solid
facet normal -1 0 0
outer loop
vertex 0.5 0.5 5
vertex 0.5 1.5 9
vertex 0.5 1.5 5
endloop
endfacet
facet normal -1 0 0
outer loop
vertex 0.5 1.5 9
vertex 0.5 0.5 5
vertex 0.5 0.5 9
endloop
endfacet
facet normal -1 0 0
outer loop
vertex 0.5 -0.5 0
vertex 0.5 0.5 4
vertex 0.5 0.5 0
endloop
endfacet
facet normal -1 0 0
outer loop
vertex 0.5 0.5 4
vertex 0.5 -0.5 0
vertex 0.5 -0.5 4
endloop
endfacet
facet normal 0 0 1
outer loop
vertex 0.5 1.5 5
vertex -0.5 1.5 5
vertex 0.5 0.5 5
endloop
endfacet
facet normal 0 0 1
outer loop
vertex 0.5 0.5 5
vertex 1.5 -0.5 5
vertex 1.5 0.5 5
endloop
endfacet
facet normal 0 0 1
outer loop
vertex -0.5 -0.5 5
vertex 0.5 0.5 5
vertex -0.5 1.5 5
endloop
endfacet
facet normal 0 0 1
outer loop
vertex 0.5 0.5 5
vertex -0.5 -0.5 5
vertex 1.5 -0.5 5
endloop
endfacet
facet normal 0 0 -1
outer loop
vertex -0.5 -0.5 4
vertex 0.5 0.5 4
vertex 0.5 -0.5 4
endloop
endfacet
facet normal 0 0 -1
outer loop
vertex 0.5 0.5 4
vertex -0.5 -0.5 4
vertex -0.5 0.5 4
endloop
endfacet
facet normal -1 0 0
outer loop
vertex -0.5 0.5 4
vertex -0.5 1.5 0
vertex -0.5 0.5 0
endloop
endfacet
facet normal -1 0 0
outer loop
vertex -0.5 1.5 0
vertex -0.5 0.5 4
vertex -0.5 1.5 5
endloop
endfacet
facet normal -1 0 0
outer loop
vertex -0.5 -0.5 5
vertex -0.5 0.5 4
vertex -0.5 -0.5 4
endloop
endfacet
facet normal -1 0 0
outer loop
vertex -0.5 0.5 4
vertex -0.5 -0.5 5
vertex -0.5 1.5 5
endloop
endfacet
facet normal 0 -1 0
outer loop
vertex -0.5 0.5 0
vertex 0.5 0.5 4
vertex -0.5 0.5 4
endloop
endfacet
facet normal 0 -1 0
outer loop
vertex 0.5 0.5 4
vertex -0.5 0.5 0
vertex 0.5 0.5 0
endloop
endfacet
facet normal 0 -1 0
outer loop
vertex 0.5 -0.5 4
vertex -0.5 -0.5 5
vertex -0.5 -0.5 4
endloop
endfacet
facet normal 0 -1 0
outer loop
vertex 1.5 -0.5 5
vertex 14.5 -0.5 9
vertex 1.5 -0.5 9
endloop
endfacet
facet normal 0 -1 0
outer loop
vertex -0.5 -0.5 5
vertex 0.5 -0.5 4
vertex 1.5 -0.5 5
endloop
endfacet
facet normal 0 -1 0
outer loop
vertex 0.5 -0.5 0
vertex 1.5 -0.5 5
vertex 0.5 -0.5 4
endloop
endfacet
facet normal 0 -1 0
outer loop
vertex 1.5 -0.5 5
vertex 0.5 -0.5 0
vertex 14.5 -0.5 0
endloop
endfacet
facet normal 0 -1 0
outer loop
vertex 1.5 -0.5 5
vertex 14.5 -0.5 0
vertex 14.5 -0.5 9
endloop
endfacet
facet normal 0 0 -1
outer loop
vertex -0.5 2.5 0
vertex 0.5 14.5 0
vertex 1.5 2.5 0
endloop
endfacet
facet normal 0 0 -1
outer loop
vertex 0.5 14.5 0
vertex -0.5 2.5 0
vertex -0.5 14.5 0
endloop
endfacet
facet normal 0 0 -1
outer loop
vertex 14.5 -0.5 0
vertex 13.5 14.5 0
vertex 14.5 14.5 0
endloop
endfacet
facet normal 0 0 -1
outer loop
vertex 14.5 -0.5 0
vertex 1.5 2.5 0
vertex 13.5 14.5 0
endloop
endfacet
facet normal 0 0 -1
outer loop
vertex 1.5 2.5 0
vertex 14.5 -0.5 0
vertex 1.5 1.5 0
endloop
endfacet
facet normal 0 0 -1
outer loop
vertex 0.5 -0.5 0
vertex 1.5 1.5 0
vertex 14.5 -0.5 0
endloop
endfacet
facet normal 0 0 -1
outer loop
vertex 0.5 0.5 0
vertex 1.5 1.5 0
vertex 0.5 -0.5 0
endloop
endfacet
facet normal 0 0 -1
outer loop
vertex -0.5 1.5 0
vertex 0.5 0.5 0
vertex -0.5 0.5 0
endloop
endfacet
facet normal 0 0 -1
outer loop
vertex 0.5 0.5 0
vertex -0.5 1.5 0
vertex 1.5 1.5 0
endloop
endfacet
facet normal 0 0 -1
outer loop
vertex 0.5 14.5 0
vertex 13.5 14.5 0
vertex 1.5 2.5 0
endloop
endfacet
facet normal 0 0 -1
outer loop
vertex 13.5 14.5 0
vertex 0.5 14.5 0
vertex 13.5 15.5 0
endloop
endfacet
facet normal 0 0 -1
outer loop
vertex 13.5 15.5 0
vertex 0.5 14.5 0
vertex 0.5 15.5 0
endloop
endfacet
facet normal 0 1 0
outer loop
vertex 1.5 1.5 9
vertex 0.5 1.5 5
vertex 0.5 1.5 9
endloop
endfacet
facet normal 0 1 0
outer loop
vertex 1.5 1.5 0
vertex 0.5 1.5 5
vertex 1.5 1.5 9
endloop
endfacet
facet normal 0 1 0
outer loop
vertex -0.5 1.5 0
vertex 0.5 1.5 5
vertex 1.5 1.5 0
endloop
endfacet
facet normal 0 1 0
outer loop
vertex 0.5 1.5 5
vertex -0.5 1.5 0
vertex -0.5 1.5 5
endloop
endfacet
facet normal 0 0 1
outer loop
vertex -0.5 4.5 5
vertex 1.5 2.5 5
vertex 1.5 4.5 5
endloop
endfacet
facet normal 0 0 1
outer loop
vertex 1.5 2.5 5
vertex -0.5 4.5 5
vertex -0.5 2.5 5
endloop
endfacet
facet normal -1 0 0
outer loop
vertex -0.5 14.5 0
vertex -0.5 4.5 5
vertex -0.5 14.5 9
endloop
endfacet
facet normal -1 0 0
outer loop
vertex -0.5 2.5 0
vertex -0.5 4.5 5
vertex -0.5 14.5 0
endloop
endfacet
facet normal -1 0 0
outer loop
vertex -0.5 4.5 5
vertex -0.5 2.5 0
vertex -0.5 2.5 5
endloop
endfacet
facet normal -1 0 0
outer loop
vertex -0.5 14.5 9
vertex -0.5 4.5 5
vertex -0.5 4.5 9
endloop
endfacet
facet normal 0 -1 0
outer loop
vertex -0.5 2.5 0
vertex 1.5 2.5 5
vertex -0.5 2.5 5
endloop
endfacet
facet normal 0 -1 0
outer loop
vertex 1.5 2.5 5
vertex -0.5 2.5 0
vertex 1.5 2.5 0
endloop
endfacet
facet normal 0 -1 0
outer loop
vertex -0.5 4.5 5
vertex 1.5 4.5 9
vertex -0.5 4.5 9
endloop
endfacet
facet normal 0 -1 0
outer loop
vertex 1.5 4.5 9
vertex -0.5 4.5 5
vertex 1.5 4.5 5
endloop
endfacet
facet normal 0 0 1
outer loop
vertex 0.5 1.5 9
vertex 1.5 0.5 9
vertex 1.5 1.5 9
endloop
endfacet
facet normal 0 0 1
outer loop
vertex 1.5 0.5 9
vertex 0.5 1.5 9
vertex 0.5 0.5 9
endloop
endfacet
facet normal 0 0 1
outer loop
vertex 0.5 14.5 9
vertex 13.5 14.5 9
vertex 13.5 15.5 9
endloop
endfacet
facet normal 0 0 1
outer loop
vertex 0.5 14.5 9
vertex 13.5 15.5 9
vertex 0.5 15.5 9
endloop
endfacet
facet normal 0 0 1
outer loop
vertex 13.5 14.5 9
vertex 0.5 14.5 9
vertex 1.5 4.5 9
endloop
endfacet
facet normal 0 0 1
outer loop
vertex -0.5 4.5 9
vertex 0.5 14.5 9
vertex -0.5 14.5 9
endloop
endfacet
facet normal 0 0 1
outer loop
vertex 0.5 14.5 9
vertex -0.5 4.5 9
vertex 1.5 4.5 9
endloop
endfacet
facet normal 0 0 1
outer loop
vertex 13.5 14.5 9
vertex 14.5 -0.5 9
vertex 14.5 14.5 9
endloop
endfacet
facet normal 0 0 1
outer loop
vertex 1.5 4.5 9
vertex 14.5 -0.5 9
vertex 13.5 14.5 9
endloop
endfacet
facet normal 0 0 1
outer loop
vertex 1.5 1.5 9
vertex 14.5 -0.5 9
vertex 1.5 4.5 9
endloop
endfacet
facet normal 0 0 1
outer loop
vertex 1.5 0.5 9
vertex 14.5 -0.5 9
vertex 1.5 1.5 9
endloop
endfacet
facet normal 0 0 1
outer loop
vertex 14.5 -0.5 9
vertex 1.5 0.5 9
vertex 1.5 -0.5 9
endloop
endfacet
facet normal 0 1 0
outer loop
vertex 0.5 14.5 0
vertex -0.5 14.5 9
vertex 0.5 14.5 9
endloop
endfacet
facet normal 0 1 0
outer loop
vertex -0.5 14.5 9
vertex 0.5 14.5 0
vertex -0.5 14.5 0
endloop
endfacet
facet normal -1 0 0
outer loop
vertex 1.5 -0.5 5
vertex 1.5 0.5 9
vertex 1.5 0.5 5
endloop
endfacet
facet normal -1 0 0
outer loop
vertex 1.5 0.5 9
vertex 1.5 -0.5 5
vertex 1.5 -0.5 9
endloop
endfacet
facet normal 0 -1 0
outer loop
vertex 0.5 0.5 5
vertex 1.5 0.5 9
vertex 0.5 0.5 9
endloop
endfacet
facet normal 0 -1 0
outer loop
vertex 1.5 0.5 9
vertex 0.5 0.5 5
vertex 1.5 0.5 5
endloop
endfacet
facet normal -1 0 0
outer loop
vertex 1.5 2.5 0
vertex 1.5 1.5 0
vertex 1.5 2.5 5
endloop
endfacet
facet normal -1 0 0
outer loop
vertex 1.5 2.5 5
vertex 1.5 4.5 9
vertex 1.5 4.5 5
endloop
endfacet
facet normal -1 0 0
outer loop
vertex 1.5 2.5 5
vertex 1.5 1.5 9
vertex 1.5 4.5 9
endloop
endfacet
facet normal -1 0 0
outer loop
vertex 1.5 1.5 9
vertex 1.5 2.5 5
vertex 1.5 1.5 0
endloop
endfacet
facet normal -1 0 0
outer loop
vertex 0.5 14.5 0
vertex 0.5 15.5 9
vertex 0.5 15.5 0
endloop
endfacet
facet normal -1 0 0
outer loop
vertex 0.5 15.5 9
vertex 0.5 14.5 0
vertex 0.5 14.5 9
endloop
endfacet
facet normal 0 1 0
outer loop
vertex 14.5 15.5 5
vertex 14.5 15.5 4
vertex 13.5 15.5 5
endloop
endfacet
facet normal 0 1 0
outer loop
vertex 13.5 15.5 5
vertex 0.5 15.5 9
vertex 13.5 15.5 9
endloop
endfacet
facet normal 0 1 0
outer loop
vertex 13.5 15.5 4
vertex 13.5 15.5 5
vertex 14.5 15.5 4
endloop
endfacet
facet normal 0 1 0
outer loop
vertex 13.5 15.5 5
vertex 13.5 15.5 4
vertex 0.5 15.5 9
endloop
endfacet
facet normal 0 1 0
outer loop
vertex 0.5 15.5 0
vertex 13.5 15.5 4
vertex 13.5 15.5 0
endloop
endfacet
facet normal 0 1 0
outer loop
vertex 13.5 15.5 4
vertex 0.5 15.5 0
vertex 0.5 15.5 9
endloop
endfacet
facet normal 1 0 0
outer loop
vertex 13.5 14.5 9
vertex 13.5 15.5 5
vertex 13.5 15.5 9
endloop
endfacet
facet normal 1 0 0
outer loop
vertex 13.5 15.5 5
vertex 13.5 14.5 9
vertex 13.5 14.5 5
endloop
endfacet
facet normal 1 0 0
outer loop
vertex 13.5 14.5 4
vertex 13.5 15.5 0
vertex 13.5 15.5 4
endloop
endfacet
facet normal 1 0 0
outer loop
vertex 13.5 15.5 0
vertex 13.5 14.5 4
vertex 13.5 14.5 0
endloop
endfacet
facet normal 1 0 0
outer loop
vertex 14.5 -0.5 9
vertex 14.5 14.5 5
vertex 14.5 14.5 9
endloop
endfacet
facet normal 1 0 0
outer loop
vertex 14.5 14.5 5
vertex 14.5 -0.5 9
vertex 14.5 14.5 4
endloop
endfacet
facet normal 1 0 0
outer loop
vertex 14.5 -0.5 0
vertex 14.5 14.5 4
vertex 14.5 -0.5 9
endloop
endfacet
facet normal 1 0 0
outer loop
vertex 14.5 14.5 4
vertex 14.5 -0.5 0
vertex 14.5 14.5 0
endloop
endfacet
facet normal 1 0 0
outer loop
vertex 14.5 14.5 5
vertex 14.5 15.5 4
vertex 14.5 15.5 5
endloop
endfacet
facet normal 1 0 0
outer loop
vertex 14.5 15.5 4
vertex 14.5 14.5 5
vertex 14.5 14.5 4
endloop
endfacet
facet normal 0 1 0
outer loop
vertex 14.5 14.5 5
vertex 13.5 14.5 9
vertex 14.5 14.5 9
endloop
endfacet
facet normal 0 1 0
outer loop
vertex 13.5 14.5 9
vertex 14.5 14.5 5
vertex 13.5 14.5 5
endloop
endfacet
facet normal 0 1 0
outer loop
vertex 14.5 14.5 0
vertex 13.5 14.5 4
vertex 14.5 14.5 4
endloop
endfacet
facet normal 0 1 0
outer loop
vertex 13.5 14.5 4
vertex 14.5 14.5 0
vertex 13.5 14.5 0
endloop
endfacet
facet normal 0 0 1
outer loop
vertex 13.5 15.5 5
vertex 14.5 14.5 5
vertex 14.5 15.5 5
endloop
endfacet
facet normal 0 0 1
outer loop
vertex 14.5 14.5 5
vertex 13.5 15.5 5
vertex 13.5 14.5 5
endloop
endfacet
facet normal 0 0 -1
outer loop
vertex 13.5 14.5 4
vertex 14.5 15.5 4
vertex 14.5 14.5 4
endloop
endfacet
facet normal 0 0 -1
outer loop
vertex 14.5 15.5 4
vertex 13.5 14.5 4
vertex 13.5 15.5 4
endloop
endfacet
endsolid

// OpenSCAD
union() {
    translate([0, 0, 4.5]) color([1, 0, 0]) cube([1, 1, 1], center=true);
    translate([0, 1, 2.5]) cube([1, 1, 5], center=true);
    translate([0, 3, 2.5]) cube([1, 1, 5], center=true);
    translate([0, 4, 2.5]) cube([1, 1, 5], center=true);
    translate([0, 5, 4.5]) cube([1, 1, 9], center=true);
    translate([0, 6, 4.5]) cube([1, 1, 9], center=true);
    translate([0, 7, 4.5]) cube([1, 1, 9], center=true);
    translate([0, 8, 4.5]) cube([1, 1, 9], center=true);
    translate([0, 9, 4.5]) cube([1, 1, 9], center=true);
    translate([0, 10, 4.5]) cube([1, 1, 9], center=true);
    translate([0, 11, 4.5]) cube([1, 1, 9], center=true);
    translate([0, 12, 4.5]) cube([1, 1, 9], center=true);
    translate([0, 13, 4.5]) cube([1, 1, 9], center=true);
    translate([0, 14, 4.5]) cube([1, 1, 9], center=true);
    translate([1, 0, 2.5]) cube([1, 1, 5], center=true);
    translate([1, 1, 4.5]) cube([1, 1, 9], center=true);
    translate([1, 3, 2.5]) cube([1, 1, 5], center=true);
    translate([1, 4, 2.5]) cube([1, 1, 5], center=true);
    translate([1, 5, 4.5]) cube([1, 1, 9], center=true);
    translate([1, 6, 4.5]) cube([1, 1, 9], center=true);
    translate([1, 7, 4.5]) cube([1, 1, 9], center=true);
    translate([1, 8, 4.5]) cube([1, 1, 9], center=true);
    translate([1, 9, 4.5]) cube([1, 1, 9], center=true);
    translate([1, 10, 4.5]) cube([1, 1, 9], center=true);
    translate([1, 11, 4.5]) cube([1, 1, 9], center=true);
    translate([1, 12, 4.5]) cube([1, 1, 9], center=true);
    translate([1, 13, 4.5]) cube([1, 1, 9], center=true);
    translate([1, 14, 4.5]) cube([1, 1, 9], center=true);
    translate([1, 15, 4.5]) cube([1, 1, 9], center=true);
    translate([2, 0, 4.5]) cube([1, 1, 9], center=true);
    translate([2, 1, 4.5]) cube([1, 1, 9], center=true);
    translate([2, 2, 4.5]) cube([1, 1, 9], center=true);
    translate([2, 3, 4.5]) cube([1, 1, 9], center=true);
    translate([2, 4, 4.5]) cube([1, 1, 9], center=true);
    translate([2, 5, 4.5]) cube([1, 1, 9], center=true);
    translate([2, 6, 4.5]) cube([1, 1, 9], center=true);
    translate([2, 7, 4.5]) cube([1, 1, 9], center=true);
    translate([2, 8, 4.5]) cube([1, 1, 9], center=true);
    translate([2, 9, 4.5]) cube([1, 1, 9], center=true);
    translate([2, 10, 4.5]) cube([1, 1, 9], center=true);
    translate([2, 11, 4.5]) cube([1, 1, 9], center=true);
    translate([2, 12, 4.5]) cube([1, 1, 9], center=true);
    translate([2, 13, 4.5]) cube([1, 1, 9], center=true);
    translate([2, 14, 4.5]) cube([1, 1, 9], center=true);
    translate([2, 15, 4.5]) cube([1, 1, 9], center=true);
    translate([3, 0, 4.5]) cube([1, 1, 9], center=true);
    translate([3, 1, 4.5]) cube([1, 1, 9], center=true);
    translate([3, 2, 4.5]) cube([1, 1, 9], center=true);
    translate([3, 3, 4.5]) cube([1, 1, 9], center=true);
    translate([3, 4, 4.5]) cube([1, 1, 9], center=true);
    translate([3, 5, 4.5]) cube([1, 1, 9], center=true);
    translate([3, 6, 4.5]) cube([1, 1, 9], center=true);
    translate([3, 7, 4.5]) cube([1, 1, 9], center=true);
    translate([3, 8, 4.5]) cube([1, 1, 9], center=true);
    translate([3, 9, 4.5]) cube([1, 1, 9], center=true);
    translate([3, 10, 4.5]) cube([1, 1, 9], center=true);
    translate([3, 11, 4.5]) cube([1, 1, 9], center=true);
    translate([3, 12, 4.5]) cube([1, 1, 9], center=true);
    translate([3, 13, 4.5]) cube([1, 1, 9], center=true);
    translate([3, 14, 4.5]) cube([1, 1, 9], center=true);
    translate([3, 15, 4.5]) cube([1, 1, 9], center=true);
    translate([4, 0, 4.5]) cube([1, 1, 9], center=true);
    translate([4, 1, 4.5]) cube([1, 1, 9], center=true);
    translate([4, 2, 4.5]) cube([1, 1, 9], center=true);
    translate([4, 3, 4.5]) cube([1, 1, 9], center=true);
    translate([4, 4, 4.5]) cube([1, 1, 9], center=true);
    translate([4, 5, 4.5]) cube([1, 1, 9], center=true);
    translate([4, 6, 4.5]) cube([1, 1, 9], center=true);
    translate([4, 7, 4.5]) cube([1, 1, 9], center=true);
    translate([4, 8, 4.5]) cube([1, 1, 9], center=true);
    translate([4, 9, 4.5]) cube([1, 1, 9], center=true);
    translate([4, 10, 4.5]) cube([1, 1, 9], center=true);
    translate([4, 11, 4.5]) cube([1, 1, 9], center=true);
    translate([4, 12, 4.5]) cube([1, 1, 9], center=true);
    translate([4, 13, 4.5]) cube([1, 1, 9], center=true);
    translate([4, 14, 4.5]) cube([1, 1, 9], center=true);
    translate([4, 15, 4.5]) cube([1, 1, 9], center=true);
    translate([5, 0, 4.5]) cube([1, 1, 9], center=true);
    translate([5, 1, 4.5]) cube([1, 1, 9], center=true);
    translate([5, 2, 4.5]) cube([1, 1, 9], center=true);
    translate([5, 3, 4.5]) cube([1, 1, 9], center=true);
    translate([5, 4, 4.5]) cube([1, 1, 9], center=true);
    translate([5, 5, 4.5]) cube([1, 1, 9], center=true);
    translate([5, 6, 4.5]) cube([1, 1, 9], center=true);
    translate([5, 7, 4.5]) cube([1, 1, 9], center=true);
    translate([5, 8, 4.5]) cube([1, 1, 9], center=true);
    translate([5, 9, 4.5]) cube([1, 1, 9], center=true);
    translate([5, 10, 4.5]) cube([1, 1, 9], center=true);
    translate([5, 11, 4.5]) cube([1, 1, 9], center=true);
    translate([5, 12, 4.5]) cube([1, 1, 9], center=true);
    translate([5, 13, 4.5]) cube([1, 1, 9], center=true);
    translate([5, 14, 4.5]) cube([1, 1, 9], center=true);
    translate([5, 15, 4.5]) cube([1, 1, 9], center=true);
    translate([6, 0, 4.5]) cube([1, 1, 9], center=true);
    translate([6, 1, 4.5]) cube([1, 1, 9], center=true);
    translate([6, 2, 4.5]) cube([1, 1, 9], center=true);
    translate([6, 3, 4.5]) cube([1, 1, 9], center=true);
    translate([6, 4, 4.5]) cube([1, 1, 9], center=true);
    translate([6, 5, 4.5]) cube([1, 1, 9], center=true);
    translate([6, 6, 4.5]) cube([1, 1, 9], center=true);
    translate([6, 7, 4.5]) cube([1, 1, 9], center=true);
    translate([6, 8, 4.5]) cube([1, 1, 9], center=true);
    translate([6, 9, 4.5]) cube([1, 1, 9], center=true);
    translate([6, 10, 4.5]) cube([1, 1, 9], center=true);
    translate([6, 11, 4.5]) cube([1, 1, 9], center=true);
    translate([6, 12, 4.5]) cube([1, 1, 9], center=true);
    translate([6, 13, 4.5]) cube([1, 1, 9], center=true);
    translate([6, 14, 4.5]) cube([1, 1, 9], center=true);
    translate([6, 15, 4.5]) cube([1, 1, 9], center=true);
    translate([7, 0, 4.5]) cube([1, 1, 9], center=true);
    translate([7, 1, 4.5]) cube([1, 1, 9], center=true);
    translate([7, 2, 4.5]) cube([1, 1, 9], center=true);
    translate([7, 3, 4.5]) cube([1, 1, 9], center=true);
    translate([7, 4, 4.5]) cube([1, 1, 9], center=true);
    translate([7, 5, 4.5]) cube([1, 1, 9], center=true);
    translate([7, 6, 4.5]) cube([1, 1, 9], center=true);
    translate([7, 7, 4.5]) cube([1, 1, 9], center=true);
    translate([7, 8, 4.5]) cube([1, 1, 9], center=true);
    translate([7, 9, 4.5]) cube([1, 1, 9], center=true);
    translate([7, 10, 4.5]) cube([1, 1, 9], center=true);
    translate([7, 11, 4.5]) cube([1, 1, 9], center=true);
    translate([7, 12, 4.5]) cube([1, 1, 9], center=true);
    translate([7, 13, 4.5]) cube([1, 1, 9], center=true);
    translate([7, 14, 4.5]) cube([1, 1, 9], center=true);
    translate([7, 15, 4.5]) cube([1, 1, 9], center=true);
    translate([8, 0, 4.5]) cube([1, 1, 9], center=true);
    translate([8, 1, 4.5]) cube([1, 1, 9], center=true);
    translate([8, 2, 4.5]) cube([1, 1, 9], center=true);
    translate([8, 3, 4.5]) cube([1, 1, 9], center=true);
    translate([8, 4, 4.5]) cube([1, 1, 9], center=true);
    translate([8, 5, 4.5]) cube([1, 1, 9], center=true);
    translate([8, 6, 4.5]) cube([1, 1, 9], center=true);
    translate([8, 7, 4.5]) cube([1, 1, 9], center=true);
    translate([8, 8, 4.5]) cube([1, 1, 9], center=true);
    translate([8, 9, 4.5]) cube([1, 1, 9], center=true);
    translate([8, 10, 4.5]) cube([1, 1, 9], center=true);
    translate([8, 11, 4.5]) cube([1, 1, 9], center=true);
    translate([8, 12, 4.5]) cube([1, 1, 9], center=true);
    translate([8, 13, 4.5]) cube([1, 1, 9], center=true);
    translate([8, 14, 4.5]) cube([1, 1, 9], center=true);
    translate([8, 15, 4.5]) cube([1, 1, 9], center=true);
    translate([9, 0, 4.5]) cube([1, 1, 9], center=true);
    translate([9, 1, 4.5]) cube([1, 1, 9], center=true);
    translate([9, 2, 4.5]) cube([1, 1, 9], center=true);
    translate([9, 3, 4.5]) cube([1, 1, 9], center=true);
    translate([9, 4, 4.5]) cube([1, 1, 9], center=true);
    translate([9, 5, 4.5]) cube([1, 1, 9], center=true);
    translate([9, 6, 4.5]) cube([1, 1, 9], center=true);
    translate([9, 7, 4.5]) cube([1, 1, 9], center=true);
    translate([9, 8, 4.5]) cube([1, 1, 9], center=true);
    translate([9, 9, 4.5]) cube([1, 1, 9], center=true);
    translate([9, 10, 4.5]) cube([1, 1, 9], center=true);
    translate([9, 11, 4.5]) cube([1, 1, 9], center=true);
    translate([9, 12, 4.5]) cube([1, 1, 9], center=true);
    translate([9, 13, 4.5]) cube([1, 1, 9], center=true);
    translate([9, 14, 4.5]) cube([1, 1, 9], center=true);
    translate([9, 15, 4.5]) cube([1, 1, 9], center=true);
    translate([10, 0, 4.5]) cube([1, 1, 9], center=true);
    translate([10, 1, 4.5]) cube([1, 1, 9], center=true);
    translate([10, 2, 4.5]) cube([1, 1, 9], center=true);
    translate([10, 3, 4.5]) cube([1, 1, 9], center=true);
    translate([10, 4, 4.5]) cube([1, 1, 9], center=true);
    translate([10, 5, 4.5]) cube([1, 1, 9], center=true);
    translate([10, 6, 4.5]) cube([1, 1, 9], center=true);
    translate([10, 7, 4.5]) cube([1, 1, 9], center=true);
    translate([10, 8, 4.5]) cube([1, 1, 9], center=true);
    translate([10, 9, 4.5]) cube([1, 1, 9], center=true);
    translate([10, 10, 4.5]) cube([1, 1, 9], center=true);
    translate([10, 11, 4.5]) cube([1, 1, 9], center=true);
    translate([10, 12, 4.5]) cube([1, 1, 9], center=true);
    translate([10, 13, 4.5]) cube([1, 1, 9], center=true);
    translate([10, 14, 4.5]) cube([1, 1, 9], center=true);
    translate([10, 15, 4.5]) cube([1, 1, 9], center=true);
    translate([11, 0, 4.5]) cube([1, 1, 9], center=true);
    translate([11, 1, 4.5]) cube([1, 1, 9], center=true);
    translate([11, 2, 4.5]) cube([1, 1, 9], center=true);
    translate([11, 3, 4.5]) cube([1, 1, 9], center=true);
    translate([11, 4, 4.5]) cube([1, 1, 9], center=true);
    translate([11, 5, 4.5]) cube([1, 1, 9], center=true);
    translate([11, 6, 4.5]) cube([1, 1, 9], center=true);
    translate([11, 7, 4.5]) cube([1, 1, 9], center=true);
    translate([11, 8, 4.5]) cube([1, 1, 9], center=true);
    translate([11, 9, 4.5]) cube([1, 1, 9], center=true);
    translate([11, 10, 4.5]) cube([1, 1, 9], center=true);
    translate([11, 11, 4.5]) cube([1, 1, 9], center=true);
    translate([11, 12, 4.5]) cube([1, 1, 9], center=true);
    translate([11, 13, 4.5]) cube([1, 1, 9], center=true);
    translate([11, 14, 4.5]) cube([1, 1, 9], center=true);
    translate([11, 15, 4.5]) cube([1, 1, 9], center=true);
    translate([12, 0, 4.5]) cube([1, 1, 9], center=true);
    translate([12, 1, 4.5]) cube([1, 1, 9], center=true);
    translate([12, 2, 4.5]) cube([1, 1, 9], center=true);
    translate([12, 3, 4.5]) cube([1, 1, 9], center=true);
    translate([12, 4, 4.5]) cube([1, 1, 9], center=true);
    translate([12, 5, 4.5]) cube([1, 1, 9], center=true);
    translate([12, 6, 4.5]) cube([1, 1, 9], center=true);
    translate([12, 7, 4.5]) cube([1, 1, 9], center=true);
    translate([12, 8, 4.5]) cube([1, 1, 9], center=true);
    translate([12, 9, 4.5]) cube([1, 1, 9], center=true);
    translate([12, 10, 4.5]) cube([1, 1, 9], center=true);
    translate([12, 11, 4.5]) cube([1, 1, 9], center=true);
    translate([12, 12, 4.5]) cube([1, 1, 9], center=true);
    translate([12, 13, 4.5]) cube([1, 1, 9], center=true);
    translate([12, 14, 4.5]) cube([1, 1, 9], center=true);
    translate([12, 15, 4.5]) cube([1, 1, 9], center=true);
    translate([13, 0, 4.5]) cube([1, 1, 9], center=true);
    translate([13, 1, 4.5]) cube([1, 1, 9], center=true);
    translate([13, 2, 4.5]) cube([1, 1, 9], center=true);
    translate([13, 3, 4.5]) cube([1, 1, 9], center=true);
    translate([13, 4, 4.5]) cube([1, 1, 9], center=true);
    translate([13, 5, 4.5]) cube([1, 1, 9], center=true);
    translate([13, 6, 4.5]) cube([1, 1, 9], center=true);
    translate([13, 7, 4.5]) cube([1, 1, 9], center=true);
    translate([13, 8, 4.5]) cube([1, 1, 9], center=true);
    translate([13, 9, 4.5]) cube([1, 1, 9], center=true);
    translate([13, 10, 4.5]) cube([1, 1, 9], center=true);
    translate([13, 11, 4.5]) cube([1, 1, 9], center=true);
    translate([13, 12, 4.5]) cube([1, 1, 9], center=true);
    translate([13, 13, 4.5]) cube([1, 1, 9], center=true);
    translate([13, 14, 4.5]) cube([1, 1, 9], center=true);
    translate([13, 15, 4.5]) cube([1, 1, 9], center=true);
    translate([14, 0, 4.5]) cube([1, 1, 9], center=true);
    translate([14, 1, 4.5]) cube([1, 1, 9], center=true);
    translate([14, 2, 4.5]) cube([1, 1, 9], center=true);
    translate([14, 3, 4.5]) cube([1, 1, 9], center=true);
    translate([14, 4, 4.5]) cube([1, 1, 9], center=true);
    translate([14, 5, 4.5]) cube([1, 1, 9], center=true);
    translate([14, 6, 4.5]) cube([1, 1, 9], center=true);
    translate([14, 7, 4.5]) cube([1, 1, 9], center=true);
    translate([14, 8, 4.5]) cube([1, 1, 9], center=true);
    translate([14, 9, 4.5]) cube([1, 1, 9], center=true);
    translate([14, 10, 4.5]) cube([1, 1, 9], center=true);
    translate([14, 11, 4.5]) cube([1, 1, 9], center=true);
    translate([14, 12, 4.5]) cube([1, 1, 9], center=true);
    translate([14, 13, 4.5]) cube([1, 1, 9], center=true);
    translate([14, 14, 4.5]) cube([1, 1, 9], center=true);
    translate([14, 15, 4.5]) color([0, 0, 1]) cube([1, 1, 1], center=true);
}
